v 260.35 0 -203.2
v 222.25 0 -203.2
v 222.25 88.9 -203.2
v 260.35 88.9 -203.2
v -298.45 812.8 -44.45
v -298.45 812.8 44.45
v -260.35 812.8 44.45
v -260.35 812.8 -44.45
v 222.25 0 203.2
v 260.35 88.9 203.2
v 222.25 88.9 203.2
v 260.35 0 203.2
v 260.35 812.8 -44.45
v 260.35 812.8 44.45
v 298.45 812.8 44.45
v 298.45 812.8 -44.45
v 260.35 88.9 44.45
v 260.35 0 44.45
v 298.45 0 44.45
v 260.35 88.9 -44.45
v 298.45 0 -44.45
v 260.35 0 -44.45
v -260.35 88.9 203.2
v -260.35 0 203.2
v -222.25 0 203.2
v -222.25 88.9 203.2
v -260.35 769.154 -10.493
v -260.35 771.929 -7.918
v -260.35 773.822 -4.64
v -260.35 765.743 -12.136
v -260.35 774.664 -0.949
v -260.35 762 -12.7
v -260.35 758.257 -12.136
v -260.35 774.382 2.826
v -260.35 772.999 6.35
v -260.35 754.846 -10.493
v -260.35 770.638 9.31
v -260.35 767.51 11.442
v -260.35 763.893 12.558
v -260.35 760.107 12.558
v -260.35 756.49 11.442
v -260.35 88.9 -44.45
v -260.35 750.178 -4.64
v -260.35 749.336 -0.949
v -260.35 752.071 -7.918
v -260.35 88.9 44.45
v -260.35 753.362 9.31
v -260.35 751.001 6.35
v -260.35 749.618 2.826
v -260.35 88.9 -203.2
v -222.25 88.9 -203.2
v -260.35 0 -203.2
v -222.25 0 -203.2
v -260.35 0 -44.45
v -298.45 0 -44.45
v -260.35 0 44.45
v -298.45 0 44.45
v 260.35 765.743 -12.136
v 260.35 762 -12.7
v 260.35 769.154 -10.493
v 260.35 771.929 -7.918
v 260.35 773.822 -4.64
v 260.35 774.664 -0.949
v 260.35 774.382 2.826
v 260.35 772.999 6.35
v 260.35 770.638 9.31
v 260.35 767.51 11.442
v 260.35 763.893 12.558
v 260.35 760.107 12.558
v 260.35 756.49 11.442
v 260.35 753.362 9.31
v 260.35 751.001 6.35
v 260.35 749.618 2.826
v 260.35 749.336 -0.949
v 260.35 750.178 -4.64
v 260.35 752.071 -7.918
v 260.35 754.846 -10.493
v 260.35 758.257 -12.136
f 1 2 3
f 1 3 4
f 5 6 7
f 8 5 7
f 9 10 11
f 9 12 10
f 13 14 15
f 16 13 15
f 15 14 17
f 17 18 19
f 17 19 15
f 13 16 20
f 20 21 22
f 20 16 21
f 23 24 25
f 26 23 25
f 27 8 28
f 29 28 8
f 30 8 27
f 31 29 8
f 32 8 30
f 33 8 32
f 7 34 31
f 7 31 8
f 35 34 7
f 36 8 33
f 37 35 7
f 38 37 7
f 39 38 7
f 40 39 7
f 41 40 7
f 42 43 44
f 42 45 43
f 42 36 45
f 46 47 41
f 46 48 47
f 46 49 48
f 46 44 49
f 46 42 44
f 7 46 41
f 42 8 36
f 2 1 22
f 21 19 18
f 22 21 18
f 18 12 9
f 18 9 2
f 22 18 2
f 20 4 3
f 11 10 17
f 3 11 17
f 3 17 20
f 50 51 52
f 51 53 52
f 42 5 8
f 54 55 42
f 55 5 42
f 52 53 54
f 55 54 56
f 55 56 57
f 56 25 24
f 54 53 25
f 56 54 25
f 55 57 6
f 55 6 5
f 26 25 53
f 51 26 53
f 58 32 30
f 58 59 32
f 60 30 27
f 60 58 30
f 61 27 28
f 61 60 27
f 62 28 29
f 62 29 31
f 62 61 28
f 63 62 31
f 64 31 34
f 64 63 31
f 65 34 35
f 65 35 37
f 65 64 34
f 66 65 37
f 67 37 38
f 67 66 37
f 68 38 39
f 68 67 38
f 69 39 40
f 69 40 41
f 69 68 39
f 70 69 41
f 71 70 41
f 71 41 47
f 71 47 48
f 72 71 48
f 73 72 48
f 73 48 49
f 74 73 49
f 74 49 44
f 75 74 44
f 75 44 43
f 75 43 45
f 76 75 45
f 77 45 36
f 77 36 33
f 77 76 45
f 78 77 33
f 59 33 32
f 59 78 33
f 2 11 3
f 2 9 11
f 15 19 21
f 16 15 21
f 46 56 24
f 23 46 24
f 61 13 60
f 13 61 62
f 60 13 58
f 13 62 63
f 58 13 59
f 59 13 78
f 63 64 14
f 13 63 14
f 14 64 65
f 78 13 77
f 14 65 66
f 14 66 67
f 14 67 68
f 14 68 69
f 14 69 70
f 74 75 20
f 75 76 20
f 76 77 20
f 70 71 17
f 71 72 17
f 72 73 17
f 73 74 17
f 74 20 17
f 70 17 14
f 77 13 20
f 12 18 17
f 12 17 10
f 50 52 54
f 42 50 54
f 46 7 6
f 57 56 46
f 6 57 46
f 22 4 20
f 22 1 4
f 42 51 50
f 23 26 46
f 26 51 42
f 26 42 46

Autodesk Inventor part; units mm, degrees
ref_plane "YZ Plane" through (0, 0, 0) normal (1, 0, 0) x (0, 1, 0)
ref_plane "XZ Plane" through (0, 0, 0) normal (0, 1, 0) x (-1, 0, 0)
ref_plane "XY Plane" through (0, 0, 0) normal (0, 0, 1) x (1, 0, 0)
sketch "Sketch1" plane through (0, 0, 0) normal (0, 1, 0) x (-1, 0, 0)
  line L0 (0, -284.48) -> (0, 284.48) projected
  line L1 (-364.49, 0) -> (364.49, 0) projected
  line L2 (260.35, 203.2) -> (222.25, 203.2)
  line L3 (222.25, 203.2) -> (222.25, -203.2)
  line L4 (222.25, -203.2) -> (260.35, -203.2)
  line L5 (260.35, -203.2) -> (260.35, 203.2)
  line L6 (260.35, 203.2) -> (222.25, -203.2) construction
  line L7 (222.25, 203.2) -> (260.35, -203.2) construction
  line L8 (-260.35, 203.2) -> (-222.25, 203.2)
  line L9 (-222.25, 203.2) -> (-222.25, -203.2)
  line L10 (-222.25, -203.2) -> (-260.35, -203.2)
  line L11 (-260.35, -203.2) -> (-260.35, 203.2)
  line L12 (-260.35, 203.2) -> (-222.25, -203.2) construction
  line L13 (-222.25, 203.2) -> (-260.35, -203.2) construction
  point P0 (0, 0)
  point P1 (241.3, 0)
  point P2 (-241.3, 0)
  dimension "d0" = 38.1
  dimension "d1" = 406.4
  dimension "d3" = 260.35
extrude "Extrusion1" add sketch "Sketch1" along normal blind 88.9
sketch "Sketch2" plane through (0, 0, 0) normal (0, -1, 0) x (1, 0, 0)
  line L0 (-260.35, 203.2) -> (-222.25, 203.2) projected
  line L1 (-260.35, -203.2) -> (-260.35, 203.2) projected
  line L2 (-222.25, -203.2) -> (-260.35, -203.2) projected
  line L3 (-222.25, 203.2) -> (-222.25, -203.2) projected
  line L4 (260.35, 203.2) -> (222.25, 203.2) projected
  line L5 (222.25, 203.2) -> (222.25, -203.2) projected
  line L6 (222.25, -203.2) -> (260.35, -203.2) projected
  line L7 (260.35, -203.2) -> (260.35, 203.2) projected
  line L8 (-417.83, 0) -> (417.83, 0) projected
  line L9 (-298.45, -44.45) -> (-260.35, -44.45)
  line L10 (-260.35, -44.45) -> (-260.35, 44.45)
  line L11 (-260.35, 44.45) -> (-298.45, 44.45)
  line L12 (-298.45, 44.45) -> (-298.45, -44.45)
  line L13 (-298.45, -44.45) -> (-260.35, 44.45) construction
  line L14 (-260.35, -44.45) -> (-298.45, 44.45) construction
  line L15 (0, 284.48) -> (0, -284.48) projected
  line L16 (298.45, -44.45) -> (260.35, -44.45)
  line L17 (260.35, -44.45) -> (260.35, 44.45)
  line L18 (260.35, 44.45) -> (298.45, 44.45)
  line L19 (298.45, 44.45) -> (298.45, -44.45)
  line L20 (298.45, -44.45) -> (260.35, 44.45) construction
  line L21 (260.35, -44.45) -> (298.45, 44.45) construction
  point P0 (0, 0)
  point P1 (-279.4, 0)
  point P2 (279.4, 0)
  dimension "d6" = 38.1
  dimension "d7" = 88.9
extrude "Extrusion2" add sketch "Sketch2" against normal blind 812.8 contours L1 L8 L12 L11 | L1 L9 L12 L8 | L8 L19 L16 L7 | L7 L18 L19 L8
sketch "Sketch3" plane through (298.45, 0, 44.45) normal (1, 0, 0) x (0, 0, -1)
  line L0 (88.9, 0) -> (0, 0) projected
  line L1 (88.9, 0) -> (88.9, 812.8) projected
  line L2 (0, 812.8) -> (88.9, 812.8) projected
  line L3 (0, 0) -> (0, 812.8) projected
  line L4 (44.45, -162.56) -> (44.45, 975.36) projected
  circle A0 centre (44.45, 762) radius 12.7
  point P0 (44.45, 0)
  dimension "d10" = 25.4
  dimension "d11" = 762
extrude "Extrusion3" add sketch "Sketch3" against normal up to surface (596.9 mm away) contours A0 L4 | L4 A0
properties part number "Perch"
